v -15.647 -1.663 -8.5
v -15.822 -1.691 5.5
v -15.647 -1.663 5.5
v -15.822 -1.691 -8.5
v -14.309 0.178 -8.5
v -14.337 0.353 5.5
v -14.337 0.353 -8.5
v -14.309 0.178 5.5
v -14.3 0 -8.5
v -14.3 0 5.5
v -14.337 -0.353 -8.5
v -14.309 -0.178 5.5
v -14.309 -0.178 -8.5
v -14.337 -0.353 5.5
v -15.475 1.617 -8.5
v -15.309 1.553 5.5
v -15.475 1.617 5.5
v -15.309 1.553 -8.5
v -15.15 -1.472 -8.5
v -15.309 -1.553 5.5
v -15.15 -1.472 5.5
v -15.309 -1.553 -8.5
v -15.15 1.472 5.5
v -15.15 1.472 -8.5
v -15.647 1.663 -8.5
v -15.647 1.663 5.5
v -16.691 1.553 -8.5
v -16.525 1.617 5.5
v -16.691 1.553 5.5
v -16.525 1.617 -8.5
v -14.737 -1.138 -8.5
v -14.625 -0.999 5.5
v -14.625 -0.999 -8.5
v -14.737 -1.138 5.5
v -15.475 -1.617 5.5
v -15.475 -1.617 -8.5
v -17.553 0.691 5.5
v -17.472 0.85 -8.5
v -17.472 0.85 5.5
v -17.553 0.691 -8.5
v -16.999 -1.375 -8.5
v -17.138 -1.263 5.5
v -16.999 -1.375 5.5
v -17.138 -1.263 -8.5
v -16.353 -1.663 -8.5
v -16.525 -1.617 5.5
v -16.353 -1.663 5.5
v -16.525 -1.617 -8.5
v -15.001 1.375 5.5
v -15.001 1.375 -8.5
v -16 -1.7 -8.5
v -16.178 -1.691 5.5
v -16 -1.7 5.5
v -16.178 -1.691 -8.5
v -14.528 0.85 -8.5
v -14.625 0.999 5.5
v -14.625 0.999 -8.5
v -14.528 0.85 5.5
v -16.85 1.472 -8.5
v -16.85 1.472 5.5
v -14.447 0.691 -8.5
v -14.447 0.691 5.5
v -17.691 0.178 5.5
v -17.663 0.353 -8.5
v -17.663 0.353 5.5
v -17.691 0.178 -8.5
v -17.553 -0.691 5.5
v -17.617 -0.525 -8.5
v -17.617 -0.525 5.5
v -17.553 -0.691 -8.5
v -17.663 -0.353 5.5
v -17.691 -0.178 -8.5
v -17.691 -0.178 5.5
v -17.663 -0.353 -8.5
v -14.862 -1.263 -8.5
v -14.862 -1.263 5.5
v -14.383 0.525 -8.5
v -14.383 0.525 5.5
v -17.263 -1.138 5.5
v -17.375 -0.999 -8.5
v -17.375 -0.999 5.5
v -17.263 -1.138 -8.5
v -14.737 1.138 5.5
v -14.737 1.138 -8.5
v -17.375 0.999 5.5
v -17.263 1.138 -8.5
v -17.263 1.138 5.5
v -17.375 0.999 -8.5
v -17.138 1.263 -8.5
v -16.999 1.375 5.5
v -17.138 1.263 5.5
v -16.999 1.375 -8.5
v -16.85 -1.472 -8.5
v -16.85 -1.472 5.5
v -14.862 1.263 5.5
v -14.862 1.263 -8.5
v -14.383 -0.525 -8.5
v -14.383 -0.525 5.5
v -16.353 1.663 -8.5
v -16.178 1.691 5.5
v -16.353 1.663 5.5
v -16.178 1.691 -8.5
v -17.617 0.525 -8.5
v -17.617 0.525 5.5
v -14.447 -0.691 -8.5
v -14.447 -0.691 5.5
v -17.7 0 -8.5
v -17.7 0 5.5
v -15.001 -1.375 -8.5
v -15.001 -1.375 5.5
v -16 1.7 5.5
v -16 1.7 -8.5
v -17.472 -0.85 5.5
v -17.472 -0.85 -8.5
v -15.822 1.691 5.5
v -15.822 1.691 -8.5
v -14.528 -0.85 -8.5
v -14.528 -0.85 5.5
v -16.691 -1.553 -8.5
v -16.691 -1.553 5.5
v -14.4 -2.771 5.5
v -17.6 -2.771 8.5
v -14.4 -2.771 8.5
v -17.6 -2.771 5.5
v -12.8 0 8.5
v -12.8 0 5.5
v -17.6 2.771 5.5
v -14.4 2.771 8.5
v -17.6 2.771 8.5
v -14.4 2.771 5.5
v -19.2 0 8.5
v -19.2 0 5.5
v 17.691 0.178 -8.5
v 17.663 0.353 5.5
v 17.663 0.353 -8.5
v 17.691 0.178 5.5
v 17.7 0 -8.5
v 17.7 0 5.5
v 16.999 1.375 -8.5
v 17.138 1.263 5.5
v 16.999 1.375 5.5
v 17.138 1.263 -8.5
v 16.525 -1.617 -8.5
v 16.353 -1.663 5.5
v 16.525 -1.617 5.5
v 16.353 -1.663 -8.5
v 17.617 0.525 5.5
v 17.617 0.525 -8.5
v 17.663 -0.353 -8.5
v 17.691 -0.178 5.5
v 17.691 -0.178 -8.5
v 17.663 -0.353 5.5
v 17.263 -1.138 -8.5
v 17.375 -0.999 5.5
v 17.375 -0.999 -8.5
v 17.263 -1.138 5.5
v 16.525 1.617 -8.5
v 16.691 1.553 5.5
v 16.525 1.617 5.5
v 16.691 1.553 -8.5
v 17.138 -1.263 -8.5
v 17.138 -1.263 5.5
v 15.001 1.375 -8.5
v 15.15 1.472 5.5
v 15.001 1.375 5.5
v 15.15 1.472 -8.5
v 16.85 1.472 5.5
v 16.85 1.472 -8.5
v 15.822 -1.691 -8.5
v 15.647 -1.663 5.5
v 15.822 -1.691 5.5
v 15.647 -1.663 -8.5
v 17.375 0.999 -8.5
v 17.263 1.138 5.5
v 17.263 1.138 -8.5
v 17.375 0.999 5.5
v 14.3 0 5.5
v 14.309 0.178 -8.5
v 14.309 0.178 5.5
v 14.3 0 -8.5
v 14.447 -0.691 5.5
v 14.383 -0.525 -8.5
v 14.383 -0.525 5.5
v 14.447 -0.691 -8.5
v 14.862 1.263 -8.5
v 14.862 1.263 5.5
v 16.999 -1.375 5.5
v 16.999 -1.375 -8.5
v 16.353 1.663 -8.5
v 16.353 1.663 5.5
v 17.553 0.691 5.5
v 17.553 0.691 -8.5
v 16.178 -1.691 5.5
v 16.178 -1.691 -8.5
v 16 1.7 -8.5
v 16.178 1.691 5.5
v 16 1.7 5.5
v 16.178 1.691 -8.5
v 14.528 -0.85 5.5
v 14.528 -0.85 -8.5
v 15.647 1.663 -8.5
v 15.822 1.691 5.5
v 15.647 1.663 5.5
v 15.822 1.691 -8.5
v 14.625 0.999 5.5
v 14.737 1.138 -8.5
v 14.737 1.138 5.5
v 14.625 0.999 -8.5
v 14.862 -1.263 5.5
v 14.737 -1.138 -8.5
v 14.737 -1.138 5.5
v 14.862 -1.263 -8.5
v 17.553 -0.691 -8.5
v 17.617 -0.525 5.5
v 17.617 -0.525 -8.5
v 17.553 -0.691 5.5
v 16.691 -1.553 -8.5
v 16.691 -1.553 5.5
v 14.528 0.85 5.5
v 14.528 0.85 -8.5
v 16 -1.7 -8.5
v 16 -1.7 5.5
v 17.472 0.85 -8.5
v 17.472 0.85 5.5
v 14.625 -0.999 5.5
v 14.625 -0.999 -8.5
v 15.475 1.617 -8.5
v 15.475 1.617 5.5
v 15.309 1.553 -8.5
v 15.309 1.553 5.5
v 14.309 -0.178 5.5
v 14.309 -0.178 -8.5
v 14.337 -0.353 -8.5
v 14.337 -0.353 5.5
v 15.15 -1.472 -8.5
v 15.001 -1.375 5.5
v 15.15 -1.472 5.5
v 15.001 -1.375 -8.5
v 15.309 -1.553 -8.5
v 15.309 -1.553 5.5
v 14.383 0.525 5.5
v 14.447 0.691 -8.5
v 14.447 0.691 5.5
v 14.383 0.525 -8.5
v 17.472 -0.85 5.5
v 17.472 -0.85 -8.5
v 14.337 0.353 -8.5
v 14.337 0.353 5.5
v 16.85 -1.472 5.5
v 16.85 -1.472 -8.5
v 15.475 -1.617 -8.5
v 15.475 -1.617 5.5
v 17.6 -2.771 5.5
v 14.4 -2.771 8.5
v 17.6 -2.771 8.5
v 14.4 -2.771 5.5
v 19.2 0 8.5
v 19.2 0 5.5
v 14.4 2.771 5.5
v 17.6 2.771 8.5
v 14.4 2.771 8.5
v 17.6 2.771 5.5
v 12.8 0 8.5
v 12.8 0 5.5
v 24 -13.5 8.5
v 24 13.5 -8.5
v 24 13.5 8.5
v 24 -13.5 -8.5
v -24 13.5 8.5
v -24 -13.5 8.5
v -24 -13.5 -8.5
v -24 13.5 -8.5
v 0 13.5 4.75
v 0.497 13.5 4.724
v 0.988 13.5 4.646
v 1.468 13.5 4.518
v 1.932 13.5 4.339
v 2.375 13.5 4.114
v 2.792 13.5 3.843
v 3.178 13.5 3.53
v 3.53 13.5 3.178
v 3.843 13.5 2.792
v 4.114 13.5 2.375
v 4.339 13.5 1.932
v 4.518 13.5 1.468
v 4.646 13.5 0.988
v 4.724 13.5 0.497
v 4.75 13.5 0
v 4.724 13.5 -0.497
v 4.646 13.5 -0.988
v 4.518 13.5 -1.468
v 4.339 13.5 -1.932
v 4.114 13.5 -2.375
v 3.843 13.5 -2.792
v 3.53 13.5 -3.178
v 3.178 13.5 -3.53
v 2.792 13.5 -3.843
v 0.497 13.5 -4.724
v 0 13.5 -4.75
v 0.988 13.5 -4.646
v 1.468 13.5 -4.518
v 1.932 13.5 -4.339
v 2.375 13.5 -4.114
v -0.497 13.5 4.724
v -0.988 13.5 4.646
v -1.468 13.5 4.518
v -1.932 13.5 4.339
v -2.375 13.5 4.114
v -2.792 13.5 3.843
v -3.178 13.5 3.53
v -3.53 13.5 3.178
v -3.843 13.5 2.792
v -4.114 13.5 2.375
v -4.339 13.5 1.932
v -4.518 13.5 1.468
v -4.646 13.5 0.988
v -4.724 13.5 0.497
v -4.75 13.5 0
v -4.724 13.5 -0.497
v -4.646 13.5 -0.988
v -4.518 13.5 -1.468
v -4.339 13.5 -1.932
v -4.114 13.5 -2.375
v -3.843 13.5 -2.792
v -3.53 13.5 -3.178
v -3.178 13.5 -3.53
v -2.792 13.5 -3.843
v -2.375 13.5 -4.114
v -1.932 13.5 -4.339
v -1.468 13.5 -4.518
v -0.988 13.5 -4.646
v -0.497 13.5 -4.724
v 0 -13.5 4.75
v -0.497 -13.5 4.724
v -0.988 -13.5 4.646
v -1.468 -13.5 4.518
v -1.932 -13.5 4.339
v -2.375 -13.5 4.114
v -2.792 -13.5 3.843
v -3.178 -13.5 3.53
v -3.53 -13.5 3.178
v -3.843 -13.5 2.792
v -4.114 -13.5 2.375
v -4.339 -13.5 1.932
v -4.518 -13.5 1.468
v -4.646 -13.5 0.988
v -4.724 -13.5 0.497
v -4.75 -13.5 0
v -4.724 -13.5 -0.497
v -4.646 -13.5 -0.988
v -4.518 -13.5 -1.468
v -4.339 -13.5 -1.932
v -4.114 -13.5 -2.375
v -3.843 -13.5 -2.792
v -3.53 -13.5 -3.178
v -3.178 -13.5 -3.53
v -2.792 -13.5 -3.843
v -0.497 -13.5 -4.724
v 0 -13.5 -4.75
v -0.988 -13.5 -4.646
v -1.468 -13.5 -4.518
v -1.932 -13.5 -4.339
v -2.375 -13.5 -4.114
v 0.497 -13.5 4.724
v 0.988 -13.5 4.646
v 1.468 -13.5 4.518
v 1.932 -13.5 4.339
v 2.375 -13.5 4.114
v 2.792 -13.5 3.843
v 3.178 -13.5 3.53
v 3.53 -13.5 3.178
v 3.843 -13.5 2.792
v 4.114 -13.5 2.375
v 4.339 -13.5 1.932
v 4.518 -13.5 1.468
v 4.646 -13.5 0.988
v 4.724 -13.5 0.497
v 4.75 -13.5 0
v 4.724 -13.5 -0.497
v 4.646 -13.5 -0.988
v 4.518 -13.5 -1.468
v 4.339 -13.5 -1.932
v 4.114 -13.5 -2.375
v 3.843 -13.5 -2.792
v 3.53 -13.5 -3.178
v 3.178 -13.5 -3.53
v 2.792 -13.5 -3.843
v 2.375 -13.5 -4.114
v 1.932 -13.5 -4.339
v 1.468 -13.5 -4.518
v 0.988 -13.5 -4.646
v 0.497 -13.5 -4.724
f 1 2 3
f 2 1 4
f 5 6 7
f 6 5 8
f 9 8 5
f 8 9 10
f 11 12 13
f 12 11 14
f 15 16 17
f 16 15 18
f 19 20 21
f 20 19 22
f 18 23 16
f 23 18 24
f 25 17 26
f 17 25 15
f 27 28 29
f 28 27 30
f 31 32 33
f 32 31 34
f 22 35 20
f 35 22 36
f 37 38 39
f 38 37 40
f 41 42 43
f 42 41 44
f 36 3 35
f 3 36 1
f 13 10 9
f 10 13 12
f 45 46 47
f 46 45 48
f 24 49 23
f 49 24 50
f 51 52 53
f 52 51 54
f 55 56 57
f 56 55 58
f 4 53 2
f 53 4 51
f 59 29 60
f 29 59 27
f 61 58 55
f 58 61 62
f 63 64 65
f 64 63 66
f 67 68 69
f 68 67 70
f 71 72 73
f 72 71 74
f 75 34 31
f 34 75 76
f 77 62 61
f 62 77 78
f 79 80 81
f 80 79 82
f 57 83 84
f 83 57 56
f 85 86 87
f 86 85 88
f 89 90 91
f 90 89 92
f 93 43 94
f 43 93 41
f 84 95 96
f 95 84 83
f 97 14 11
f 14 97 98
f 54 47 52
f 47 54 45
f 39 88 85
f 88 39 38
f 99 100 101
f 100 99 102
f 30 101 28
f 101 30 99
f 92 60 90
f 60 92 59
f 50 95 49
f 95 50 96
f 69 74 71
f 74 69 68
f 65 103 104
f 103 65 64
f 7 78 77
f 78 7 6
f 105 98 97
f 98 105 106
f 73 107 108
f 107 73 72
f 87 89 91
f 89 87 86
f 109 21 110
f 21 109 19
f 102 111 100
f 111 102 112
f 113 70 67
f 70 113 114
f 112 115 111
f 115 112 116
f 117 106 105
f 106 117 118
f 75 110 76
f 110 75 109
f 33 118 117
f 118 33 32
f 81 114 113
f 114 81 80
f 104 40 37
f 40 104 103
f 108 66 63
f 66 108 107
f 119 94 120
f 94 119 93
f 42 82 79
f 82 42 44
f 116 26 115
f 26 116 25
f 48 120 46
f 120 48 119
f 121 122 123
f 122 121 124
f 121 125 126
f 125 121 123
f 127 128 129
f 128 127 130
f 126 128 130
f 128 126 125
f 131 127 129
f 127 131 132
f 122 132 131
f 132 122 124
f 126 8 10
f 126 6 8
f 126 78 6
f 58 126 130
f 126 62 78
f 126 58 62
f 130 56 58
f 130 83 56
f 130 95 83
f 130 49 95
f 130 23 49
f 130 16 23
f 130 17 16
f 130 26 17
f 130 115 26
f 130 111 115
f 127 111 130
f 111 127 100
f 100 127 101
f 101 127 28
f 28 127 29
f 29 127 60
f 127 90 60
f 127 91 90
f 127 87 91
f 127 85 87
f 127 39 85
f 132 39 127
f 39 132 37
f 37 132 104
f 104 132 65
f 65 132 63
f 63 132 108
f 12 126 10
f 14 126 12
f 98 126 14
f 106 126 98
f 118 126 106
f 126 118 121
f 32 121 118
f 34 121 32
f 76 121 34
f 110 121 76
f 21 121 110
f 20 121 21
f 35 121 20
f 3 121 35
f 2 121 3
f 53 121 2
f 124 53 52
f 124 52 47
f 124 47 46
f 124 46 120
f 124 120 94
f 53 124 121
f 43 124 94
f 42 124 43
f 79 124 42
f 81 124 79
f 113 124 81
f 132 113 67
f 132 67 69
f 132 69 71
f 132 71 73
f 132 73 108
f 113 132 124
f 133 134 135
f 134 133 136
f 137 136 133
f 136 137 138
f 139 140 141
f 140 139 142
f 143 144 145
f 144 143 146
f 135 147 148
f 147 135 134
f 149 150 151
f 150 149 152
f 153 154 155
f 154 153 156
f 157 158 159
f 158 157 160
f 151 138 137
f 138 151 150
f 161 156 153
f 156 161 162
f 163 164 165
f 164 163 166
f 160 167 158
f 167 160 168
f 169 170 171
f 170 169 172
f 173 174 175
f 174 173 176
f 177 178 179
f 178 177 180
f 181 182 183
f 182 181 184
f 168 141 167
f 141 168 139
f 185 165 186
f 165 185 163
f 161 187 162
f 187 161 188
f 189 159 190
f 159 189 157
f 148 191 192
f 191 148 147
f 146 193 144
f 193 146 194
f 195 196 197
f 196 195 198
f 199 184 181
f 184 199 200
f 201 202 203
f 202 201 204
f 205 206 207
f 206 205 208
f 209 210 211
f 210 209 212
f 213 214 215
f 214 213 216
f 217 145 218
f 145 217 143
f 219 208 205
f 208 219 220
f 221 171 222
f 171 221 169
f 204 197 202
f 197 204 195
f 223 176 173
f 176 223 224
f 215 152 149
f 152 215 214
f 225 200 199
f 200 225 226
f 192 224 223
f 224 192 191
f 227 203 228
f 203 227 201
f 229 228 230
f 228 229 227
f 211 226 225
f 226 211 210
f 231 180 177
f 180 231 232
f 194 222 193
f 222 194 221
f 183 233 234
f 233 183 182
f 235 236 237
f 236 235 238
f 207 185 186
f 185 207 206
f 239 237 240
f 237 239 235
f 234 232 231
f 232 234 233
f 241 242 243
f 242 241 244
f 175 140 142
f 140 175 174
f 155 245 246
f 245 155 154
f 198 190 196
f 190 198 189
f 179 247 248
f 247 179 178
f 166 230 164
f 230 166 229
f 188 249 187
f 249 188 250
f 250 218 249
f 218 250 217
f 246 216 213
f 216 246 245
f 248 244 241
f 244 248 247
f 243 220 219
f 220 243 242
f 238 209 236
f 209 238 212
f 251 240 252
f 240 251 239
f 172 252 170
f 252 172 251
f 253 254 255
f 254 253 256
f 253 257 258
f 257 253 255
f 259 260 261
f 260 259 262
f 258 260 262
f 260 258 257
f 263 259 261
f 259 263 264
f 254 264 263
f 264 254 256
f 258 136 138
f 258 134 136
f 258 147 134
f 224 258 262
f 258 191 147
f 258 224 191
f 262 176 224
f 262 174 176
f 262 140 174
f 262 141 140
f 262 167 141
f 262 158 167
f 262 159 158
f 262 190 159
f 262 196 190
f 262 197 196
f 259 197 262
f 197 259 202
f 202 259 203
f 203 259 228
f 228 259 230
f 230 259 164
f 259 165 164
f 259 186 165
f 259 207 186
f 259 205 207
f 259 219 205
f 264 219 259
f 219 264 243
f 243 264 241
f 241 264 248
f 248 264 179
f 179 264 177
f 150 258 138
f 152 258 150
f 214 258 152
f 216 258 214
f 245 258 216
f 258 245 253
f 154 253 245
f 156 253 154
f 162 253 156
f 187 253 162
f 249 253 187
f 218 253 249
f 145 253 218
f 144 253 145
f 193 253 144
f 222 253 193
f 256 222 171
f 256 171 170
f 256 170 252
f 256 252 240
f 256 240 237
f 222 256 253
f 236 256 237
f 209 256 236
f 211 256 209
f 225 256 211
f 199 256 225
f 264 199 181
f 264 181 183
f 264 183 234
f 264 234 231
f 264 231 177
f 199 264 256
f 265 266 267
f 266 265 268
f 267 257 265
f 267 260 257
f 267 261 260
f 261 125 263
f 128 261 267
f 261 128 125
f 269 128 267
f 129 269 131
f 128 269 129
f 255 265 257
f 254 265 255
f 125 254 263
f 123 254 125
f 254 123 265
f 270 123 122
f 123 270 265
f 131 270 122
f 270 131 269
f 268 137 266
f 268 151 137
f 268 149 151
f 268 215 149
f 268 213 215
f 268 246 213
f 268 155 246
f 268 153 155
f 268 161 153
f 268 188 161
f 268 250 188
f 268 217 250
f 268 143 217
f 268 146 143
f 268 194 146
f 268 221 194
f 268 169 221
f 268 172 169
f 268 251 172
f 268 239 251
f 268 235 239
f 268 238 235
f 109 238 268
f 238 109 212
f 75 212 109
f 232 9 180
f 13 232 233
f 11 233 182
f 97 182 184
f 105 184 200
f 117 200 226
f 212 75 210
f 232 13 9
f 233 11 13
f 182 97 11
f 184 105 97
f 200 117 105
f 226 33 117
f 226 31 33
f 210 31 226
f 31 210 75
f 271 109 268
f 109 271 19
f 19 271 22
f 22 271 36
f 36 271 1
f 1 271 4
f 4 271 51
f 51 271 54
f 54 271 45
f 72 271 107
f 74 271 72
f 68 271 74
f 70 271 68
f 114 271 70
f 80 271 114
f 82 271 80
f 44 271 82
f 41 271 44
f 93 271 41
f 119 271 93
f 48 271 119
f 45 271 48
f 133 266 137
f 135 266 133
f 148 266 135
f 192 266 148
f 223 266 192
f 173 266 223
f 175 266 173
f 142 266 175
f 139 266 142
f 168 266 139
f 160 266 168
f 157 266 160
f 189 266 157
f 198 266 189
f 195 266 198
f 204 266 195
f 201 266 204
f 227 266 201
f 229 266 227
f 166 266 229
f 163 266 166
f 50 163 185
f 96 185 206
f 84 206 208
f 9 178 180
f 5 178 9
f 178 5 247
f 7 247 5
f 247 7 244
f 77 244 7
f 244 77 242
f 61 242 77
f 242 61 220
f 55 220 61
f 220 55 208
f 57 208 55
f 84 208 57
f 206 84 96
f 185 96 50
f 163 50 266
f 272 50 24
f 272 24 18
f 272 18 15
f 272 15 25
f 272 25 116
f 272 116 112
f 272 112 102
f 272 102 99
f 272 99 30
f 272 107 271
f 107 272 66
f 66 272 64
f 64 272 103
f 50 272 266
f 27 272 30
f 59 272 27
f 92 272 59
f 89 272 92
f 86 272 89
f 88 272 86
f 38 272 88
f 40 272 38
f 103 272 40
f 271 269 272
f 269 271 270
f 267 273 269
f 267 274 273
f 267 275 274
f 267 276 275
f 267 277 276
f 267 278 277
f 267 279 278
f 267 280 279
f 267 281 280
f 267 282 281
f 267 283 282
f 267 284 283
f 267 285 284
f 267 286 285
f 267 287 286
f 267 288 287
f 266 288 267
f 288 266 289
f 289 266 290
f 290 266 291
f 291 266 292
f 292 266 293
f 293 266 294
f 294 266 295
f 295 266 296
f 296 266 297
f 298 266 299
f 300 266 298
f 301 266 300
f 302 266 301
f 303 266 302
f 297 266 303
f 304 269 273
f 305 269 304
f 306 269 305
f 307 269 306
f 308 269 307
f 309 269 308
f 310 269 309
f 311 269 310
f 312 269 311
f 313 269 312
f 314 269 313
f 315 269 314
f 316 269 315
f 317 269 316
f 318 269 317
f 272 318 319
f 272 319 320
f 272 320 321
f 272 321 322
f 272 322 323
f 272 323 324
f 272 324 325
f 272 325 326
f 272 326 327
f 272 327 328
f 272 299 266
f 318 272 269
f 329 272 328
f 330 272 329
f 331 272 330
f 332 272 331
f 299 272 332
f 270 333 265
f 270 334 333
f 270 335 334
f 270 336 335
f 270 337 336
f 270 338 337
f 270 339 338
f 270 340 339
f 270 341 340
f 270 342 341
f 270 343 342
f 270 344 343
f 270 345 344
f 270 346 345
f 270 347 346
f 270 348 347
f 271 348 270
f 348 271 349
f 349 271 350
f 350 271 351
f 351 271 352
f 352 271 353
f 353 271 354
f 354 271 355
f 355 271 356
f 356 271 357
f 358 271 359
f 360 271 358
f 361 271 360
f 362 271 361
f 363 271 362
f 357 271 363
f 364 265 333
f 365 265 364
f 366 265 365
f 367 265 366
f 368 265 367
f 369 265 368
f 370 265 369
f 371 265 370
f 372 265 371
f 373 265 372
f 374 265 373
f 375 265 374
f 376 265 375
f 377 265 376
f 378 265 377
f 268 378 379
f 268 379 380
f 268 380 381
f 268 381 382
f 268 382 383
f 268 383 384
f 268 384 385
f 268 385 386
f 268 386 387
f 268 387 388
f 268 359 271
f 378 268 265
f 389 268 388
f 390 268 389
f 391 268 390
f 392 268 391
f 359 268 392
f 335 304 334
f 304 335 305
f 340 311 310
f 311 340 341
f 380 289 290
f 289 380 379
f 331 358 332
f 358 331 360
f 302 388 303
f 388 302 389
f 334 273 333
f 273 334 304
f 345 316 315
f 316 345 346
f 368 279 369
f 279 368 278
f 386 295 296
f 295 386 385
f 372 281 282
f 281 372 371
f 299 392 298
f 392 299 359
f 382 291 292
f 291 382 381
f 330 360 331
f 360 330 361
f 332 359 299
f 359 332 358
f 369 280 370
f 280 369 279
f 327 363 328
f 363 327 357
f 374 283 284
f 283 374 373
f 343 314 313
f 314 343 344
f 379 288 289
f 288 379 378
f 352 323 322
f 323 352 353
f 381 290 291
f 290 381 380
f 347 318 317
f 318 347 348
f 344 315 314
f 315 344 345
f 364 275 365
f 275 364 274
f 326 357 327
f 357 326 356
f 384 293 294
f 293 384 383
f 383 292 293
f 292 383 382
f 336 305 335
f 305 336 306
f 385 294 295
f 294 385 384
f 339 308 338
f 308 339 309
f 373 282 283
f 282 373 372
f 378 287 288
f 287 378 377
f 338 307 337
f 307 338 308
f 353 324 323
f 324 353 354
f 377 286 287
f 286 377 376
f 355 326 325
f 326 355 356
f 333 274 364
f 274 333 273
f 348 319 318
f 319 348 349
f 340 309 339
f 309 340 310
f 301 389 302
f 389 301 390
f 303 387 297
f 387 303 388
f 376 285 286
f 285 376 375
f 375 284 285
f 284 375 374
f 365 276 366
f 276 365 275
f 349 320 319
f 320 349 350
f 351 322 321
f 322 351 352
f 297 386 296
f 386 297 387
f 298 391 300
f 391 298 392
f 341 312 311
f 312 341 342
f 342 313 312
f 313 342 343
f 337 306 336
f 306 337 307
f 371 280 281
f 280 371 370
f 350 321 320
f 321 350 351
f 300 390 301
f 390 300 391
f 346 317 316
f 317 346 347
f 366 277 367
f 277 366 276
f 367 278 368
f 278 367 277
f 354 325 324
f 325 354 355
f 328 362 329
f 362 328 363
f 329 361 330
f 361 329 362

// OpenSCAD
// Cable strain-relief clamp for 9 mm bundle.
$fn = 60;
eps = 0.02;
body_l = 48;
body_w = 27;
body_h = 17;
cable_d = 9.5;
bolt_pitch = 32;
difference() {
    cube([body_l, body_w, body_h], center = true);
    translate([0, -body_w / 2 - eps, 0]) rotate([-90, 0, 0]) cylinder(d = cable_d, h = body_w + 2 * eps);
    for (x = [-bolt_pitch / 2, bolt_pitch / 2]) {
        translate([x, 0, -body_h / 2 - eps]) cylinder(d = 3.4, h = body_h + 2 * eps);
        translate([x, 0, body_h / 2 - 3]) cylinder(d = 6.4, h = 3 + eps, $fn = 6);
    }
}
